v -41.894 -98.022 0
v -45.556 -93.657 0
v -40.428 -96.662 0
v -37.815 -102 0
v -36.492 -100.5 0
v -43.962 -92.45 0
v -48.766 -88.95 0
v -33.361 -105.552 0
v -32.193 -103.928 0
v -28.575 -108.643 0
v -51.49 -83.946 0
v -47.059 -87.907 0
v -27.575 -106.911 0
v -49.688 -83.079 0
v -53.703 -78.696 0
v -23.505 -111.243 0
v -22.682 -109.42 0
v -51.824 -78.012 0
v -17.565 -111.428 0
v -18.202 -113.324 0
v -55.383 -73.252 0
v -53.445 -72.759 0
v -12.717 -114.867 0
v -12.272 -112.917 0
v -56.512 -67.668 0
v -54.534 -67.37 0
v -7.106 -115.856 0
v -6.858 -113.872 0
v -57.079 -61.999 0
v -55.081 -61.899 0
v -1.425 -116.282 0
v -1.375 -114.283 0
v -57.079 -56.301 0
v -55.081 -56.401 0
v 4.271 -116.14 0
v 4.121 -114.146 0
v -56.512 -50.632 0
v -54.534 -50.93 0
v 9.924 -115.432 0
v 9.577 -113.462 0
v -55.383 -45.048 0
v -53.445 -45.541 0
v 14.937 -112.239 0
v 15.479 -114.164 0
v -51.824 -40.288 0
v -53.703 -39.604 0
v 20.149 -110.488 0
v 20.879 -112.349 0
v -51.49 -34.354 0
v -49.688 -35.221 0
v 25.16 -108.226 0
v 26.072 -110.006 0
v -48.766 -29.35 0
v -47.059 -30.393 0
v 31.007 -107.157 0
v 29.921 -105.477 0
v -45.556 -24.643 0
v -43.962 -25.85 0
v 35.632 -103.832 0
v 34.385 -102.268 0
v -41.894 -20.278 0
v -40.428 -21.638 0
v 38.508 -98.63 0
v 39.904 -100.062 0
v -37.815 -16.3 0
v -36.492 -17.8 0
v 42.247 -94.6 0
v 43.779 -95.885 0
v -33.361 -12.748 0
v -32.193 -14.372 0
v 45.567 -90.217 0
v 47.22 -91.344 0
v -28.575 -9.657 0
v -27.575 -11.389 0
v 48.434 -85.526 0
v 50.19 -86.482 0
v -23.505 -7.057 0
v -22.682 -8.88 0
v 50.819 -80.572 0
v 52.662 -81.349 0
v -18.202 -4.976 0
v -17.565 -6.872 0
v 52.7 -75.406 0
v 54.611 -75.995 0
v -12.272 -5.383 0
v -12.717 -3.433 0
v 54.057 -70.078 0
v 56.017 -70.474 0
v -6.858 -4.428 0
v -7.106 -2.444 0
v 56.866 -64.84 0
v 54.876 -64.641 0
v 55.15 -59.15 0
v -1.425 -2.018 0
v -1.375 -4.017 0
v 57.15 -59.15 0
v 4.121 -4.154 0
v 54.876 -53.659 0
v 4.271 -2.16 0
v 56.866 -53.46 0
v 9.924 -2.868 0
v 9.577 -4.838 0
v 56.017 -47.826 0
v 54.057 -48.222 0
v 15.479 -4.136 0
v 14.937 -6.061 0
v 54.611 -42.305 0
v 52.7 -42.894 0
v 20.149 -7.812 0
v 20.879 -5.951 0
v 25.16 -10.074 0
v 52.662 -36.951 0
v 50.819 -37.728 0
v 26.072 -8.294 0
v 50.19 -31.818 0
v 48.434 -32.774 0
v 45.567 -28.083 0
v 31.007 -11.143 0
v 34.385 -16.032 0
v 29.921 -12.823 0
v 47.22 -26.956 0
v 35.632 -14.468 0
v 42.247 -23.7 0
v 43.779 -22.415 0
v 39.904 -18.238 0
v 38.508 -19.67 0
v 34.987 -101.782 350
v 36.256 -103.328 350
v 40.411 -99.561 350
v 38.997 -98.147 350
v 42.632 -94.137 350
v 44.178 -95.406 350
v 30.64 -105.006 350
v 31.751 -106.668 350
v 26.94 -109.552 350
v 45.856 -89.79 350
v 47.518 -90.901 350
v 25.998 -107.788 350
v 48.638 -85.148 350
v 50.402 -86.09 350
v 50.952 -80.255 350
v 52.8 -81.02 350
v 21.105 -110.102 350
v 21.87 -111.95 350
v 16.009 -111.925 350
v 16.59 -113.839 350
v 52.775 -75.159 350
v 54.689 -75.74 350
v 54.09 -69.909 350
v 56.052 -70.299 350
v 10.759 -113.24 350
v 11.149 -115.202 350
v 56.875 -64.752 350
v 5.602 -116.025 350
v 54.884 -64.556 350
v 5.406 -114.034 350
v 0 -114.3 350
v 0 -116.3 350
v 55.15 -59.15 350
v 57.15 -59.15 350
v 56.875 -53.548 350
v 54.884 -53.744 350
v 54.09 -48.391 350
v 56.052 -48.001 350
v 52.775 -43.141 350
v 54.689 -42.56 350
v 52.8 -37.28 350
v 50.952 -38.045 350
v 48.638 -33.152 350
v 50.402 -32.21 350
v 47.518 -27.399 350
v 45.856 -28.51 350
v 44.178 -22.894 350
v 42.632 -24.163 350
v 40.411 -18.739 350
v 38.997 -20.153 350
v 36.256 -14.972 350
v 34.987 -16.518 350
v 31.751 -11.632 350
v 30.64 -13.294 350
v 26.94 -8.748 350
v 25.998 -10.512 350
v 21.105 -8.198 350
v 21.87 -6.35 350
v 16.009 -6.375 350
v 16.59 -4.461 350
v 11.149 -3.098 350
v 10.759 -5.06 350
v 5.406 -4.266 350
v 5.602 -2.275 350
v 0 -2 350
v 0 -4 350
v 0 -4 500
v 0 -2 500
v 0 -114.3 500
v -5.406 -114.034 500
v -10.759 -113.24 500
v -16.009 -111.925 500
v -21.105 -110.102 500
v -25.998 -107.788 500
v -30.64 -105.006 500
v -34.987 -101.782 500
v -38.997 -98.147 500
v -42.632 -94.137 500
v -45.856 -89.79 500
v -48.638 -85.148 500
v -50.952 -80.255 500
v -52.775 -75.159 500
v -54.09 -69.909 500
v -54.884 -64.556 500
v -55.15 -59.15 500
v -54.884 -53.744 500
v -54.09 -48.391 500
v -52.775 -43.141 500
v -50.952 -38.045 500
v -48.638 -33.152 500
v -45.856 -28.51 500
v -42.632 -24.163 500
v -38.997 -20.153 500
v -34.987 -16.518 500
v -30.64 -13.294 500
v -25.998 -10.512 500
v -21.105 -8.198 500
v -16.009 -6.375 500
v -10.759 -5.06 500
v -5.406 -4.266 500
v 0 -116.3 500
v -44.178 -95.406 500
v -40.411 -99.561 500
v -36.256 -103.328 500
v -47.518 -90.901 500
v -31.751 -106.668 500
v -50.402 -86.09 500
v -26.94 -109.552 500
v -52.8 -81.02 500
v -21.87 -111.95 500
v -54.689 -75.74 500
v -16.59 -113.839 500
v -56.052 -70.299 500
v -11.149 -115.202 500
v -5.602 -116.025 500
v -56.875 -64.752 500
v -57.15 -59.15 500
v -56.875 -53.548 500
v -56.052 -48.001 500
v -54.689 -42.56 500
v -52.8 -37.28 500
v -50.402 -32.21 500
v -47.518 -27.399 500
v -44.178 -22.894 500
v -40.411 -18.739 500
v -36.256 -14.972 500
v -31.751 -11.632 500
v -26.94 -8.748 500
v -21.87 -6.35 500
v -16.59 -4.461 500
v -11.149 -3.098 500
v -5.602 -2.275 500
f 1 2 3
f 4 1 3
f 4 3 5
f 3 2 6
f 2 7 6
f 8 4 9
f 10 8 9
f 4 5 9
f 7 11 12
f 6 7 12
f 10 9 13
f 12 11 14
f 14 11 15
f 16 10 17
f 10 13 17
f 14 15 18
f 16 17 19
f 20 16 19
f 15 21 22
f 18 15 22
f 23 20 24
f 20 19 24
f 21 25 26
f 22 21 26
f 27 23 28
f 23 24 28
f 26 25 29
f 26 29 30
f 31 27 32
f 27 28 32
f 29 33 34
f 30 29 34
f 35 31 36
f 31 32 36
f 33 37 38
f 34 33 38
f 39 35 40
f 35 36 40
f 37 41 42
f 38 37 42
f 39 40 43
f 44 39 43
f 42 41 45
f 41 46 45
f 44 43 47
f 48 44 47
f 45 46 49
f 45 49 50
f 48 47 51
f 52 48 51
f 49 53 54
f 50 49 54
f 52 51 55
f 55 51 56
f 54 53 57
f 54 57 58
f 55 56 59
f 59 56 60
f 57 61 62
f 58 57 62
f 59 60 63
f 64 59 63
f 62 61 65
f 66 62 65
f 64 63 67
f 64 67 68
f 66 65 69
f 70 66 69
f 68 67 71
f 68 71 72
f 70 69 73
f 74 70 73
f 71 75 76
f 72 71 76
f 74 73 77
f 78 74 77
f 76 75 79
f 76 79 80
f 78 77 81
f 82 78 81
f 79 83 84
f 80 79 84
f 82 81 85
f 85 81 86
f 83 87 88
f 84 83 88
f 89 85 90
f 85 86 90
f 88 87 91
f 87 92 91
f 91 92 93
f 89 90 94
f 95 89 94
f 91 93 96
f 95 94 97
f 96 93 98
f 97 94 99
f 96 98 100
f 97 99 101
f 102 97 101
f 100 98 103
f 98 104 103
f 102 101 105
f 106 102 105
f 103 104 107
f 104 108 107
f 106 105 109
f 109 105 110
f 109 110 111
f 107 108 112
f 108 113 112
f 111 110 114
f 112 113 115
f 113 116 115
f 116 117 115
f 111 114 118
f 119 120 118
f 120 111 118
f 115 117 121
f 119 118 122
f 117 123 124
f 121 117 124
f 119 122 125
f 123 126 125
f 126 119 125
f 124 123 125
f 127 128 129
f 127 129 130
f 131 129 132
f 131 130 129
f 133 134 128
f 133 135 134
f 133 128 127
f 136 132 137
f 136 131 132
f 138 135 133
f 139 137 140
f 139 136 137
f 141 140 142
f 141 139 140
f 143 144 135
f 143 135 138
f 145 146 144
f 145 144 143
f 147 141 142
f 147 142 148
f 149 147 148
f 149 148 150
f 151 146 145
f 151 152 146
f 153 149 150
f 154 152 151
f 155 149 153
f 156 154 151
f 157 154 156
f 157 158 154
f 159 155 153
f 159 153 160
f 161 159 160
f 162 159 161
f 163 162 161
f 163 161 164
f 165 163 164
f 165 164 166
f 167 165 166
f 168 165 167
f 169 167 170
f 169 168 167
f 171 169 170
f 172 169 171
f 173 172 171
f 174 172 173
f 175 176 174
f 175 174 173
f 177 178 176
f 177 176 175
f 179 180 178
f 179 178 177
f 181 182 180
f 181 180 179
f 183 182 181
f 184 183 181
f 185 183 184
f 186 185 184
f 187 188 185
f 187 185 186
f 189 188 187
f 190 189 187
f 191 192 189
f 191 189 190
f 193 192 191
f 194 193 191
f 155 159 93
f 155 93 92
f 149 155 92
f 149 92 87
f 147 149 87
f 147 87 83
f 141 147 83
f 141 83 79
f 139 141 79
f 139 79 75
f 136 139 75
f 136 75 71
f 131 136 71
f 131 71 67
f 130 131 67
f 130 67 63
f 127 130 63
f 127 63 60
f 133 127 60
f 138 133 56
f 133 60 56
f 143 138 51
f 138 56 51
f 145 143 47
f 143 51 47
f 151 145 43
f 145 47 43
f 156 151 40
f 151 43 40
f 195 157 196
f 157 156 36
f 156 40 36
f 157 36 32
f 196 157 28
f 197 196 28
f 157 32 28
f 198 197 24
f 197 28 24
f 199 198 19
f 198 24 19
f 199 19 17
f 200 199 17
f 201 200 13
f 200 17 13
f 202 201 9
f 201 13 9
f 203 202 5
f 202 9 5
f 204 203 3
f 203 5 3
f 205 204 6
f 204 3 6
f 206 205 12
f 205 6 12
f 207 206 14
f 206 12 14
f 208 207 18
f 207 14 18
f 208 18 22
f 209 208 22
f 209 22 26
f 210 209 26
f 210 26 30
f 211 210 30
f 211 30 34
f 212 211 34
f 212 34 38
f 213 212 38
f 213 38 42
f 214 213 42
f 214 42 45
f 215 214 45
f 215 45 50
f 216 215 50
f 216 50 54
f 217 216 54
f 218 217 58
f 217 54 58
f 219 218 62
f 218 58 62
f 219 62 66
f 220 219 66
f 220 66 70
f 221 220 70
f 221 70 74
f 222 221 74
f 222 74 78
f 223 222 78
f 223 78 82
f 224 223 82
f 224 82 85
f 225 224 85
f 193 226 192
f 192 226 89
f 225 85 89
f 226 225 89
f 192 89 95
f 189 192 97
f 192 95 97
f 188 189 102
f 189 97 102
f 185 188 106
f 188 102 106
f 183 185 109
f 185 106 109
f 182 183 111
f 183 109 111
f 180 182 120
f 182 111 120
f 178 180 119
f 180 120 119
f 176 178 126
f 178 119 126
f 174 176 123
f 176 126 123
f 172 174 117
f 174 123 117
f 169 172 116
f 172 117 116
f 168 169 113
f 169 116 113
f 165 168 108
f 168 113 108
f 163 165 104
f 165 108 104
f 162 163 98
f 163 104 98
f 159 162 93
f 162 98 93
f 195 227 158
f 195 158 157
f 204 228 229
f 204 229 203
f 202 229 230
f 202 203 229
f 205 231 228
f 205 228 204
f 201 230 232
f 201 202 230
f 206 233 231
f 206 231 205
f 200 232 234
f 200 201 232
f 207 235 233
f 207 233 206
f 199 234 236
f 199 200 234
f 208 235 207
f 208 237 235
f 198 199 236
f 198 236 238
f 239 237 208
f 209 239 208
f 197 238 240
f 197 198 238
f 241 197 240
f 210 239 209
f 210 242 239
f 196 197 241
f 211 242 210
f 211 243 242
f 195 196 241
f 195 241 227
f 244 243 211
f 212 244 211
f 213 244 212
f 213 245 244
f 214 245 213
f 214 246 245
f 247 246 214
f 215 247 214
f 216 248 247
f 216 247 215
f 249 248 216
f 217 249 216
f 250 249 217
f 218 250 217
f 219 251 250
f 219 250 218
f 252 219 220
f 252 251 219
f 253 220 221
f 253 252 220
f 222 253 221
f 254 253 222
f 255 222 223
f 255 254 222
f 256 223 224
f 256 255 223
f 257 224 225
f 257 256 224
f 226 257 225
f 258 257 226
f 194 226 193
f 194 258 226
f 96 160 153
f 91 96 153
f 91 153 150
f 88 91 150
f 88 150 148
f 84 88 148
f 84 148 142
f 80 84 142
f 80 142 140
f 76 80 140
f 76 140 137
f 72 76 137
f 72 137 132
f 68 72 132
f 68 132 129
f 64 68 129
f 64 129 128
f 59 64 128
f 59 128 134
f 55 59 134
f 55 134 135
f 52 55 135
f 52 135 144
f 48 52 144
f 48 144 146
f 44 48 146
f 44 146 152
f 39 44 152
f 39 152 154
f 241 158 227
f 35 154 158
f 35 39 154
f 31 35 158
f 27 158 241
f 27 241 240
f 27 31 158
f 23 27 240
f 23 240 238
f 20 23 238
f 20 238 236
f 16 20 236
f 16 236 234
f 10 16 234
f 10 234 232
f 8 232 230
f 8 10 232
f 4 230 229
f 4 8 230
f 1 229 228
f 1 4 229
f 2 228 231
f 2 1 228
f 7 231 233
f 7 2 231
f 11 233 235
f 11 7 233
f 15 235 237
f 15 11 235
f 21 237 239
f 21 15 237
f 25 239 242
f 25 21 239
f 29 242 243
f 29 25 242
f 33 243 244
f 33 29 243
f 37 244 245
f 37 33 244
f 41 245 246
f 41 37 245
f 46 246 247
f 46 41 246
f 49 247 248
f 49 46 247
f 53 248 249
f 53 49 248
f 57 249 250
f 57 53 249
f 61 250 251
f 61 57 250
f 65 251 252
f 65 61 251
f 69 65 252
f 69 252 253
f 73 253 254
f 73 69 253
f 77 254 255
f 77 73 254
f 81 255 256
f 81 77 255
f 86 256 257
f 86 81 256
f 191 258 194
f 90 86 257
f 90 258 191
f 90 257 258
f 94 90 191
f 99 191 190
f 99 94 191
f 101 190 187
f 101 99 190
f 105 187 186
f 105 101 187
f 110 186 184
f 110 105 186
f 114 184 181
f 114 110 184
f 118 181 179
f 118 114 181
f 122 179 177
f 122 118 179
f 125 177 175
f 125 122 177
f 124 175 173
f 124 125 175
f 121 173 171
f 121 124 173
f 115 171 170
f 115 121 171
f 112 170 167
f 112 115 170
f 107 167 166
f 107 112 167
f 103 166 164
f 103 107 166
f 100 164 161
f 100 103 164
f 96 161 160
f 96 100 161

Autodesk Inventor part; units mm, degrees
ref_plane "YZ Plane" through (0, 0, 0) normal (1, 0, 0) x (0, 1, 0)
ref_plane "XZ Plane" through (0, 0, 0) normal (0, 1, 0) x (-1, 0, 0)
ref_plane "XY Plane" through (0, 0, 0) normal (0, 0, 1) x (1, 0, 0)
sketch "Sketch1" plane through (0, 0, 0) normal (0, 0, 1) x (1, 0, 0)
  circle A0 centre (0, -59.15) radius 57.15 projected
  circle A1 centre (0, -59.15) radius 59.15 projected
  circle A2 centre (0, -59.15) radius 55.15
  point P0 (0, 0)
  dimension "d0" = 110.3
extrude "Extrusion1" add sketch "Sketch1" along normal blind 500 contours A0
sketch "Sketch2" plane through (0, 0, 0) normal (1, 0, 0) x (0, 1, 0)
  line L0 (-2, 500) -> (-116.3, 500) projected
  line L1 (-2, 0) -> (-116.3, 0) projected
  line L2 (-2, 500) -> (-116.3, 500) projected
  line L3 (-2, 500) -> (-116.3, 500)
  line L4 (-116.3, 500) -> (-116.3, 350)
  line L5 (-116.3, 350) -> (-2, 350)
  line L6 (-2, 350) -> (-2, 500)
  point P0 (0, 0)
  dimension "d3" = 114.3
  dimension "d4" = 150
extrude "Extrusion2" cut sketch "Sketch2" along normal blind 500
properties part number "4.5 inch diameter pipe"
